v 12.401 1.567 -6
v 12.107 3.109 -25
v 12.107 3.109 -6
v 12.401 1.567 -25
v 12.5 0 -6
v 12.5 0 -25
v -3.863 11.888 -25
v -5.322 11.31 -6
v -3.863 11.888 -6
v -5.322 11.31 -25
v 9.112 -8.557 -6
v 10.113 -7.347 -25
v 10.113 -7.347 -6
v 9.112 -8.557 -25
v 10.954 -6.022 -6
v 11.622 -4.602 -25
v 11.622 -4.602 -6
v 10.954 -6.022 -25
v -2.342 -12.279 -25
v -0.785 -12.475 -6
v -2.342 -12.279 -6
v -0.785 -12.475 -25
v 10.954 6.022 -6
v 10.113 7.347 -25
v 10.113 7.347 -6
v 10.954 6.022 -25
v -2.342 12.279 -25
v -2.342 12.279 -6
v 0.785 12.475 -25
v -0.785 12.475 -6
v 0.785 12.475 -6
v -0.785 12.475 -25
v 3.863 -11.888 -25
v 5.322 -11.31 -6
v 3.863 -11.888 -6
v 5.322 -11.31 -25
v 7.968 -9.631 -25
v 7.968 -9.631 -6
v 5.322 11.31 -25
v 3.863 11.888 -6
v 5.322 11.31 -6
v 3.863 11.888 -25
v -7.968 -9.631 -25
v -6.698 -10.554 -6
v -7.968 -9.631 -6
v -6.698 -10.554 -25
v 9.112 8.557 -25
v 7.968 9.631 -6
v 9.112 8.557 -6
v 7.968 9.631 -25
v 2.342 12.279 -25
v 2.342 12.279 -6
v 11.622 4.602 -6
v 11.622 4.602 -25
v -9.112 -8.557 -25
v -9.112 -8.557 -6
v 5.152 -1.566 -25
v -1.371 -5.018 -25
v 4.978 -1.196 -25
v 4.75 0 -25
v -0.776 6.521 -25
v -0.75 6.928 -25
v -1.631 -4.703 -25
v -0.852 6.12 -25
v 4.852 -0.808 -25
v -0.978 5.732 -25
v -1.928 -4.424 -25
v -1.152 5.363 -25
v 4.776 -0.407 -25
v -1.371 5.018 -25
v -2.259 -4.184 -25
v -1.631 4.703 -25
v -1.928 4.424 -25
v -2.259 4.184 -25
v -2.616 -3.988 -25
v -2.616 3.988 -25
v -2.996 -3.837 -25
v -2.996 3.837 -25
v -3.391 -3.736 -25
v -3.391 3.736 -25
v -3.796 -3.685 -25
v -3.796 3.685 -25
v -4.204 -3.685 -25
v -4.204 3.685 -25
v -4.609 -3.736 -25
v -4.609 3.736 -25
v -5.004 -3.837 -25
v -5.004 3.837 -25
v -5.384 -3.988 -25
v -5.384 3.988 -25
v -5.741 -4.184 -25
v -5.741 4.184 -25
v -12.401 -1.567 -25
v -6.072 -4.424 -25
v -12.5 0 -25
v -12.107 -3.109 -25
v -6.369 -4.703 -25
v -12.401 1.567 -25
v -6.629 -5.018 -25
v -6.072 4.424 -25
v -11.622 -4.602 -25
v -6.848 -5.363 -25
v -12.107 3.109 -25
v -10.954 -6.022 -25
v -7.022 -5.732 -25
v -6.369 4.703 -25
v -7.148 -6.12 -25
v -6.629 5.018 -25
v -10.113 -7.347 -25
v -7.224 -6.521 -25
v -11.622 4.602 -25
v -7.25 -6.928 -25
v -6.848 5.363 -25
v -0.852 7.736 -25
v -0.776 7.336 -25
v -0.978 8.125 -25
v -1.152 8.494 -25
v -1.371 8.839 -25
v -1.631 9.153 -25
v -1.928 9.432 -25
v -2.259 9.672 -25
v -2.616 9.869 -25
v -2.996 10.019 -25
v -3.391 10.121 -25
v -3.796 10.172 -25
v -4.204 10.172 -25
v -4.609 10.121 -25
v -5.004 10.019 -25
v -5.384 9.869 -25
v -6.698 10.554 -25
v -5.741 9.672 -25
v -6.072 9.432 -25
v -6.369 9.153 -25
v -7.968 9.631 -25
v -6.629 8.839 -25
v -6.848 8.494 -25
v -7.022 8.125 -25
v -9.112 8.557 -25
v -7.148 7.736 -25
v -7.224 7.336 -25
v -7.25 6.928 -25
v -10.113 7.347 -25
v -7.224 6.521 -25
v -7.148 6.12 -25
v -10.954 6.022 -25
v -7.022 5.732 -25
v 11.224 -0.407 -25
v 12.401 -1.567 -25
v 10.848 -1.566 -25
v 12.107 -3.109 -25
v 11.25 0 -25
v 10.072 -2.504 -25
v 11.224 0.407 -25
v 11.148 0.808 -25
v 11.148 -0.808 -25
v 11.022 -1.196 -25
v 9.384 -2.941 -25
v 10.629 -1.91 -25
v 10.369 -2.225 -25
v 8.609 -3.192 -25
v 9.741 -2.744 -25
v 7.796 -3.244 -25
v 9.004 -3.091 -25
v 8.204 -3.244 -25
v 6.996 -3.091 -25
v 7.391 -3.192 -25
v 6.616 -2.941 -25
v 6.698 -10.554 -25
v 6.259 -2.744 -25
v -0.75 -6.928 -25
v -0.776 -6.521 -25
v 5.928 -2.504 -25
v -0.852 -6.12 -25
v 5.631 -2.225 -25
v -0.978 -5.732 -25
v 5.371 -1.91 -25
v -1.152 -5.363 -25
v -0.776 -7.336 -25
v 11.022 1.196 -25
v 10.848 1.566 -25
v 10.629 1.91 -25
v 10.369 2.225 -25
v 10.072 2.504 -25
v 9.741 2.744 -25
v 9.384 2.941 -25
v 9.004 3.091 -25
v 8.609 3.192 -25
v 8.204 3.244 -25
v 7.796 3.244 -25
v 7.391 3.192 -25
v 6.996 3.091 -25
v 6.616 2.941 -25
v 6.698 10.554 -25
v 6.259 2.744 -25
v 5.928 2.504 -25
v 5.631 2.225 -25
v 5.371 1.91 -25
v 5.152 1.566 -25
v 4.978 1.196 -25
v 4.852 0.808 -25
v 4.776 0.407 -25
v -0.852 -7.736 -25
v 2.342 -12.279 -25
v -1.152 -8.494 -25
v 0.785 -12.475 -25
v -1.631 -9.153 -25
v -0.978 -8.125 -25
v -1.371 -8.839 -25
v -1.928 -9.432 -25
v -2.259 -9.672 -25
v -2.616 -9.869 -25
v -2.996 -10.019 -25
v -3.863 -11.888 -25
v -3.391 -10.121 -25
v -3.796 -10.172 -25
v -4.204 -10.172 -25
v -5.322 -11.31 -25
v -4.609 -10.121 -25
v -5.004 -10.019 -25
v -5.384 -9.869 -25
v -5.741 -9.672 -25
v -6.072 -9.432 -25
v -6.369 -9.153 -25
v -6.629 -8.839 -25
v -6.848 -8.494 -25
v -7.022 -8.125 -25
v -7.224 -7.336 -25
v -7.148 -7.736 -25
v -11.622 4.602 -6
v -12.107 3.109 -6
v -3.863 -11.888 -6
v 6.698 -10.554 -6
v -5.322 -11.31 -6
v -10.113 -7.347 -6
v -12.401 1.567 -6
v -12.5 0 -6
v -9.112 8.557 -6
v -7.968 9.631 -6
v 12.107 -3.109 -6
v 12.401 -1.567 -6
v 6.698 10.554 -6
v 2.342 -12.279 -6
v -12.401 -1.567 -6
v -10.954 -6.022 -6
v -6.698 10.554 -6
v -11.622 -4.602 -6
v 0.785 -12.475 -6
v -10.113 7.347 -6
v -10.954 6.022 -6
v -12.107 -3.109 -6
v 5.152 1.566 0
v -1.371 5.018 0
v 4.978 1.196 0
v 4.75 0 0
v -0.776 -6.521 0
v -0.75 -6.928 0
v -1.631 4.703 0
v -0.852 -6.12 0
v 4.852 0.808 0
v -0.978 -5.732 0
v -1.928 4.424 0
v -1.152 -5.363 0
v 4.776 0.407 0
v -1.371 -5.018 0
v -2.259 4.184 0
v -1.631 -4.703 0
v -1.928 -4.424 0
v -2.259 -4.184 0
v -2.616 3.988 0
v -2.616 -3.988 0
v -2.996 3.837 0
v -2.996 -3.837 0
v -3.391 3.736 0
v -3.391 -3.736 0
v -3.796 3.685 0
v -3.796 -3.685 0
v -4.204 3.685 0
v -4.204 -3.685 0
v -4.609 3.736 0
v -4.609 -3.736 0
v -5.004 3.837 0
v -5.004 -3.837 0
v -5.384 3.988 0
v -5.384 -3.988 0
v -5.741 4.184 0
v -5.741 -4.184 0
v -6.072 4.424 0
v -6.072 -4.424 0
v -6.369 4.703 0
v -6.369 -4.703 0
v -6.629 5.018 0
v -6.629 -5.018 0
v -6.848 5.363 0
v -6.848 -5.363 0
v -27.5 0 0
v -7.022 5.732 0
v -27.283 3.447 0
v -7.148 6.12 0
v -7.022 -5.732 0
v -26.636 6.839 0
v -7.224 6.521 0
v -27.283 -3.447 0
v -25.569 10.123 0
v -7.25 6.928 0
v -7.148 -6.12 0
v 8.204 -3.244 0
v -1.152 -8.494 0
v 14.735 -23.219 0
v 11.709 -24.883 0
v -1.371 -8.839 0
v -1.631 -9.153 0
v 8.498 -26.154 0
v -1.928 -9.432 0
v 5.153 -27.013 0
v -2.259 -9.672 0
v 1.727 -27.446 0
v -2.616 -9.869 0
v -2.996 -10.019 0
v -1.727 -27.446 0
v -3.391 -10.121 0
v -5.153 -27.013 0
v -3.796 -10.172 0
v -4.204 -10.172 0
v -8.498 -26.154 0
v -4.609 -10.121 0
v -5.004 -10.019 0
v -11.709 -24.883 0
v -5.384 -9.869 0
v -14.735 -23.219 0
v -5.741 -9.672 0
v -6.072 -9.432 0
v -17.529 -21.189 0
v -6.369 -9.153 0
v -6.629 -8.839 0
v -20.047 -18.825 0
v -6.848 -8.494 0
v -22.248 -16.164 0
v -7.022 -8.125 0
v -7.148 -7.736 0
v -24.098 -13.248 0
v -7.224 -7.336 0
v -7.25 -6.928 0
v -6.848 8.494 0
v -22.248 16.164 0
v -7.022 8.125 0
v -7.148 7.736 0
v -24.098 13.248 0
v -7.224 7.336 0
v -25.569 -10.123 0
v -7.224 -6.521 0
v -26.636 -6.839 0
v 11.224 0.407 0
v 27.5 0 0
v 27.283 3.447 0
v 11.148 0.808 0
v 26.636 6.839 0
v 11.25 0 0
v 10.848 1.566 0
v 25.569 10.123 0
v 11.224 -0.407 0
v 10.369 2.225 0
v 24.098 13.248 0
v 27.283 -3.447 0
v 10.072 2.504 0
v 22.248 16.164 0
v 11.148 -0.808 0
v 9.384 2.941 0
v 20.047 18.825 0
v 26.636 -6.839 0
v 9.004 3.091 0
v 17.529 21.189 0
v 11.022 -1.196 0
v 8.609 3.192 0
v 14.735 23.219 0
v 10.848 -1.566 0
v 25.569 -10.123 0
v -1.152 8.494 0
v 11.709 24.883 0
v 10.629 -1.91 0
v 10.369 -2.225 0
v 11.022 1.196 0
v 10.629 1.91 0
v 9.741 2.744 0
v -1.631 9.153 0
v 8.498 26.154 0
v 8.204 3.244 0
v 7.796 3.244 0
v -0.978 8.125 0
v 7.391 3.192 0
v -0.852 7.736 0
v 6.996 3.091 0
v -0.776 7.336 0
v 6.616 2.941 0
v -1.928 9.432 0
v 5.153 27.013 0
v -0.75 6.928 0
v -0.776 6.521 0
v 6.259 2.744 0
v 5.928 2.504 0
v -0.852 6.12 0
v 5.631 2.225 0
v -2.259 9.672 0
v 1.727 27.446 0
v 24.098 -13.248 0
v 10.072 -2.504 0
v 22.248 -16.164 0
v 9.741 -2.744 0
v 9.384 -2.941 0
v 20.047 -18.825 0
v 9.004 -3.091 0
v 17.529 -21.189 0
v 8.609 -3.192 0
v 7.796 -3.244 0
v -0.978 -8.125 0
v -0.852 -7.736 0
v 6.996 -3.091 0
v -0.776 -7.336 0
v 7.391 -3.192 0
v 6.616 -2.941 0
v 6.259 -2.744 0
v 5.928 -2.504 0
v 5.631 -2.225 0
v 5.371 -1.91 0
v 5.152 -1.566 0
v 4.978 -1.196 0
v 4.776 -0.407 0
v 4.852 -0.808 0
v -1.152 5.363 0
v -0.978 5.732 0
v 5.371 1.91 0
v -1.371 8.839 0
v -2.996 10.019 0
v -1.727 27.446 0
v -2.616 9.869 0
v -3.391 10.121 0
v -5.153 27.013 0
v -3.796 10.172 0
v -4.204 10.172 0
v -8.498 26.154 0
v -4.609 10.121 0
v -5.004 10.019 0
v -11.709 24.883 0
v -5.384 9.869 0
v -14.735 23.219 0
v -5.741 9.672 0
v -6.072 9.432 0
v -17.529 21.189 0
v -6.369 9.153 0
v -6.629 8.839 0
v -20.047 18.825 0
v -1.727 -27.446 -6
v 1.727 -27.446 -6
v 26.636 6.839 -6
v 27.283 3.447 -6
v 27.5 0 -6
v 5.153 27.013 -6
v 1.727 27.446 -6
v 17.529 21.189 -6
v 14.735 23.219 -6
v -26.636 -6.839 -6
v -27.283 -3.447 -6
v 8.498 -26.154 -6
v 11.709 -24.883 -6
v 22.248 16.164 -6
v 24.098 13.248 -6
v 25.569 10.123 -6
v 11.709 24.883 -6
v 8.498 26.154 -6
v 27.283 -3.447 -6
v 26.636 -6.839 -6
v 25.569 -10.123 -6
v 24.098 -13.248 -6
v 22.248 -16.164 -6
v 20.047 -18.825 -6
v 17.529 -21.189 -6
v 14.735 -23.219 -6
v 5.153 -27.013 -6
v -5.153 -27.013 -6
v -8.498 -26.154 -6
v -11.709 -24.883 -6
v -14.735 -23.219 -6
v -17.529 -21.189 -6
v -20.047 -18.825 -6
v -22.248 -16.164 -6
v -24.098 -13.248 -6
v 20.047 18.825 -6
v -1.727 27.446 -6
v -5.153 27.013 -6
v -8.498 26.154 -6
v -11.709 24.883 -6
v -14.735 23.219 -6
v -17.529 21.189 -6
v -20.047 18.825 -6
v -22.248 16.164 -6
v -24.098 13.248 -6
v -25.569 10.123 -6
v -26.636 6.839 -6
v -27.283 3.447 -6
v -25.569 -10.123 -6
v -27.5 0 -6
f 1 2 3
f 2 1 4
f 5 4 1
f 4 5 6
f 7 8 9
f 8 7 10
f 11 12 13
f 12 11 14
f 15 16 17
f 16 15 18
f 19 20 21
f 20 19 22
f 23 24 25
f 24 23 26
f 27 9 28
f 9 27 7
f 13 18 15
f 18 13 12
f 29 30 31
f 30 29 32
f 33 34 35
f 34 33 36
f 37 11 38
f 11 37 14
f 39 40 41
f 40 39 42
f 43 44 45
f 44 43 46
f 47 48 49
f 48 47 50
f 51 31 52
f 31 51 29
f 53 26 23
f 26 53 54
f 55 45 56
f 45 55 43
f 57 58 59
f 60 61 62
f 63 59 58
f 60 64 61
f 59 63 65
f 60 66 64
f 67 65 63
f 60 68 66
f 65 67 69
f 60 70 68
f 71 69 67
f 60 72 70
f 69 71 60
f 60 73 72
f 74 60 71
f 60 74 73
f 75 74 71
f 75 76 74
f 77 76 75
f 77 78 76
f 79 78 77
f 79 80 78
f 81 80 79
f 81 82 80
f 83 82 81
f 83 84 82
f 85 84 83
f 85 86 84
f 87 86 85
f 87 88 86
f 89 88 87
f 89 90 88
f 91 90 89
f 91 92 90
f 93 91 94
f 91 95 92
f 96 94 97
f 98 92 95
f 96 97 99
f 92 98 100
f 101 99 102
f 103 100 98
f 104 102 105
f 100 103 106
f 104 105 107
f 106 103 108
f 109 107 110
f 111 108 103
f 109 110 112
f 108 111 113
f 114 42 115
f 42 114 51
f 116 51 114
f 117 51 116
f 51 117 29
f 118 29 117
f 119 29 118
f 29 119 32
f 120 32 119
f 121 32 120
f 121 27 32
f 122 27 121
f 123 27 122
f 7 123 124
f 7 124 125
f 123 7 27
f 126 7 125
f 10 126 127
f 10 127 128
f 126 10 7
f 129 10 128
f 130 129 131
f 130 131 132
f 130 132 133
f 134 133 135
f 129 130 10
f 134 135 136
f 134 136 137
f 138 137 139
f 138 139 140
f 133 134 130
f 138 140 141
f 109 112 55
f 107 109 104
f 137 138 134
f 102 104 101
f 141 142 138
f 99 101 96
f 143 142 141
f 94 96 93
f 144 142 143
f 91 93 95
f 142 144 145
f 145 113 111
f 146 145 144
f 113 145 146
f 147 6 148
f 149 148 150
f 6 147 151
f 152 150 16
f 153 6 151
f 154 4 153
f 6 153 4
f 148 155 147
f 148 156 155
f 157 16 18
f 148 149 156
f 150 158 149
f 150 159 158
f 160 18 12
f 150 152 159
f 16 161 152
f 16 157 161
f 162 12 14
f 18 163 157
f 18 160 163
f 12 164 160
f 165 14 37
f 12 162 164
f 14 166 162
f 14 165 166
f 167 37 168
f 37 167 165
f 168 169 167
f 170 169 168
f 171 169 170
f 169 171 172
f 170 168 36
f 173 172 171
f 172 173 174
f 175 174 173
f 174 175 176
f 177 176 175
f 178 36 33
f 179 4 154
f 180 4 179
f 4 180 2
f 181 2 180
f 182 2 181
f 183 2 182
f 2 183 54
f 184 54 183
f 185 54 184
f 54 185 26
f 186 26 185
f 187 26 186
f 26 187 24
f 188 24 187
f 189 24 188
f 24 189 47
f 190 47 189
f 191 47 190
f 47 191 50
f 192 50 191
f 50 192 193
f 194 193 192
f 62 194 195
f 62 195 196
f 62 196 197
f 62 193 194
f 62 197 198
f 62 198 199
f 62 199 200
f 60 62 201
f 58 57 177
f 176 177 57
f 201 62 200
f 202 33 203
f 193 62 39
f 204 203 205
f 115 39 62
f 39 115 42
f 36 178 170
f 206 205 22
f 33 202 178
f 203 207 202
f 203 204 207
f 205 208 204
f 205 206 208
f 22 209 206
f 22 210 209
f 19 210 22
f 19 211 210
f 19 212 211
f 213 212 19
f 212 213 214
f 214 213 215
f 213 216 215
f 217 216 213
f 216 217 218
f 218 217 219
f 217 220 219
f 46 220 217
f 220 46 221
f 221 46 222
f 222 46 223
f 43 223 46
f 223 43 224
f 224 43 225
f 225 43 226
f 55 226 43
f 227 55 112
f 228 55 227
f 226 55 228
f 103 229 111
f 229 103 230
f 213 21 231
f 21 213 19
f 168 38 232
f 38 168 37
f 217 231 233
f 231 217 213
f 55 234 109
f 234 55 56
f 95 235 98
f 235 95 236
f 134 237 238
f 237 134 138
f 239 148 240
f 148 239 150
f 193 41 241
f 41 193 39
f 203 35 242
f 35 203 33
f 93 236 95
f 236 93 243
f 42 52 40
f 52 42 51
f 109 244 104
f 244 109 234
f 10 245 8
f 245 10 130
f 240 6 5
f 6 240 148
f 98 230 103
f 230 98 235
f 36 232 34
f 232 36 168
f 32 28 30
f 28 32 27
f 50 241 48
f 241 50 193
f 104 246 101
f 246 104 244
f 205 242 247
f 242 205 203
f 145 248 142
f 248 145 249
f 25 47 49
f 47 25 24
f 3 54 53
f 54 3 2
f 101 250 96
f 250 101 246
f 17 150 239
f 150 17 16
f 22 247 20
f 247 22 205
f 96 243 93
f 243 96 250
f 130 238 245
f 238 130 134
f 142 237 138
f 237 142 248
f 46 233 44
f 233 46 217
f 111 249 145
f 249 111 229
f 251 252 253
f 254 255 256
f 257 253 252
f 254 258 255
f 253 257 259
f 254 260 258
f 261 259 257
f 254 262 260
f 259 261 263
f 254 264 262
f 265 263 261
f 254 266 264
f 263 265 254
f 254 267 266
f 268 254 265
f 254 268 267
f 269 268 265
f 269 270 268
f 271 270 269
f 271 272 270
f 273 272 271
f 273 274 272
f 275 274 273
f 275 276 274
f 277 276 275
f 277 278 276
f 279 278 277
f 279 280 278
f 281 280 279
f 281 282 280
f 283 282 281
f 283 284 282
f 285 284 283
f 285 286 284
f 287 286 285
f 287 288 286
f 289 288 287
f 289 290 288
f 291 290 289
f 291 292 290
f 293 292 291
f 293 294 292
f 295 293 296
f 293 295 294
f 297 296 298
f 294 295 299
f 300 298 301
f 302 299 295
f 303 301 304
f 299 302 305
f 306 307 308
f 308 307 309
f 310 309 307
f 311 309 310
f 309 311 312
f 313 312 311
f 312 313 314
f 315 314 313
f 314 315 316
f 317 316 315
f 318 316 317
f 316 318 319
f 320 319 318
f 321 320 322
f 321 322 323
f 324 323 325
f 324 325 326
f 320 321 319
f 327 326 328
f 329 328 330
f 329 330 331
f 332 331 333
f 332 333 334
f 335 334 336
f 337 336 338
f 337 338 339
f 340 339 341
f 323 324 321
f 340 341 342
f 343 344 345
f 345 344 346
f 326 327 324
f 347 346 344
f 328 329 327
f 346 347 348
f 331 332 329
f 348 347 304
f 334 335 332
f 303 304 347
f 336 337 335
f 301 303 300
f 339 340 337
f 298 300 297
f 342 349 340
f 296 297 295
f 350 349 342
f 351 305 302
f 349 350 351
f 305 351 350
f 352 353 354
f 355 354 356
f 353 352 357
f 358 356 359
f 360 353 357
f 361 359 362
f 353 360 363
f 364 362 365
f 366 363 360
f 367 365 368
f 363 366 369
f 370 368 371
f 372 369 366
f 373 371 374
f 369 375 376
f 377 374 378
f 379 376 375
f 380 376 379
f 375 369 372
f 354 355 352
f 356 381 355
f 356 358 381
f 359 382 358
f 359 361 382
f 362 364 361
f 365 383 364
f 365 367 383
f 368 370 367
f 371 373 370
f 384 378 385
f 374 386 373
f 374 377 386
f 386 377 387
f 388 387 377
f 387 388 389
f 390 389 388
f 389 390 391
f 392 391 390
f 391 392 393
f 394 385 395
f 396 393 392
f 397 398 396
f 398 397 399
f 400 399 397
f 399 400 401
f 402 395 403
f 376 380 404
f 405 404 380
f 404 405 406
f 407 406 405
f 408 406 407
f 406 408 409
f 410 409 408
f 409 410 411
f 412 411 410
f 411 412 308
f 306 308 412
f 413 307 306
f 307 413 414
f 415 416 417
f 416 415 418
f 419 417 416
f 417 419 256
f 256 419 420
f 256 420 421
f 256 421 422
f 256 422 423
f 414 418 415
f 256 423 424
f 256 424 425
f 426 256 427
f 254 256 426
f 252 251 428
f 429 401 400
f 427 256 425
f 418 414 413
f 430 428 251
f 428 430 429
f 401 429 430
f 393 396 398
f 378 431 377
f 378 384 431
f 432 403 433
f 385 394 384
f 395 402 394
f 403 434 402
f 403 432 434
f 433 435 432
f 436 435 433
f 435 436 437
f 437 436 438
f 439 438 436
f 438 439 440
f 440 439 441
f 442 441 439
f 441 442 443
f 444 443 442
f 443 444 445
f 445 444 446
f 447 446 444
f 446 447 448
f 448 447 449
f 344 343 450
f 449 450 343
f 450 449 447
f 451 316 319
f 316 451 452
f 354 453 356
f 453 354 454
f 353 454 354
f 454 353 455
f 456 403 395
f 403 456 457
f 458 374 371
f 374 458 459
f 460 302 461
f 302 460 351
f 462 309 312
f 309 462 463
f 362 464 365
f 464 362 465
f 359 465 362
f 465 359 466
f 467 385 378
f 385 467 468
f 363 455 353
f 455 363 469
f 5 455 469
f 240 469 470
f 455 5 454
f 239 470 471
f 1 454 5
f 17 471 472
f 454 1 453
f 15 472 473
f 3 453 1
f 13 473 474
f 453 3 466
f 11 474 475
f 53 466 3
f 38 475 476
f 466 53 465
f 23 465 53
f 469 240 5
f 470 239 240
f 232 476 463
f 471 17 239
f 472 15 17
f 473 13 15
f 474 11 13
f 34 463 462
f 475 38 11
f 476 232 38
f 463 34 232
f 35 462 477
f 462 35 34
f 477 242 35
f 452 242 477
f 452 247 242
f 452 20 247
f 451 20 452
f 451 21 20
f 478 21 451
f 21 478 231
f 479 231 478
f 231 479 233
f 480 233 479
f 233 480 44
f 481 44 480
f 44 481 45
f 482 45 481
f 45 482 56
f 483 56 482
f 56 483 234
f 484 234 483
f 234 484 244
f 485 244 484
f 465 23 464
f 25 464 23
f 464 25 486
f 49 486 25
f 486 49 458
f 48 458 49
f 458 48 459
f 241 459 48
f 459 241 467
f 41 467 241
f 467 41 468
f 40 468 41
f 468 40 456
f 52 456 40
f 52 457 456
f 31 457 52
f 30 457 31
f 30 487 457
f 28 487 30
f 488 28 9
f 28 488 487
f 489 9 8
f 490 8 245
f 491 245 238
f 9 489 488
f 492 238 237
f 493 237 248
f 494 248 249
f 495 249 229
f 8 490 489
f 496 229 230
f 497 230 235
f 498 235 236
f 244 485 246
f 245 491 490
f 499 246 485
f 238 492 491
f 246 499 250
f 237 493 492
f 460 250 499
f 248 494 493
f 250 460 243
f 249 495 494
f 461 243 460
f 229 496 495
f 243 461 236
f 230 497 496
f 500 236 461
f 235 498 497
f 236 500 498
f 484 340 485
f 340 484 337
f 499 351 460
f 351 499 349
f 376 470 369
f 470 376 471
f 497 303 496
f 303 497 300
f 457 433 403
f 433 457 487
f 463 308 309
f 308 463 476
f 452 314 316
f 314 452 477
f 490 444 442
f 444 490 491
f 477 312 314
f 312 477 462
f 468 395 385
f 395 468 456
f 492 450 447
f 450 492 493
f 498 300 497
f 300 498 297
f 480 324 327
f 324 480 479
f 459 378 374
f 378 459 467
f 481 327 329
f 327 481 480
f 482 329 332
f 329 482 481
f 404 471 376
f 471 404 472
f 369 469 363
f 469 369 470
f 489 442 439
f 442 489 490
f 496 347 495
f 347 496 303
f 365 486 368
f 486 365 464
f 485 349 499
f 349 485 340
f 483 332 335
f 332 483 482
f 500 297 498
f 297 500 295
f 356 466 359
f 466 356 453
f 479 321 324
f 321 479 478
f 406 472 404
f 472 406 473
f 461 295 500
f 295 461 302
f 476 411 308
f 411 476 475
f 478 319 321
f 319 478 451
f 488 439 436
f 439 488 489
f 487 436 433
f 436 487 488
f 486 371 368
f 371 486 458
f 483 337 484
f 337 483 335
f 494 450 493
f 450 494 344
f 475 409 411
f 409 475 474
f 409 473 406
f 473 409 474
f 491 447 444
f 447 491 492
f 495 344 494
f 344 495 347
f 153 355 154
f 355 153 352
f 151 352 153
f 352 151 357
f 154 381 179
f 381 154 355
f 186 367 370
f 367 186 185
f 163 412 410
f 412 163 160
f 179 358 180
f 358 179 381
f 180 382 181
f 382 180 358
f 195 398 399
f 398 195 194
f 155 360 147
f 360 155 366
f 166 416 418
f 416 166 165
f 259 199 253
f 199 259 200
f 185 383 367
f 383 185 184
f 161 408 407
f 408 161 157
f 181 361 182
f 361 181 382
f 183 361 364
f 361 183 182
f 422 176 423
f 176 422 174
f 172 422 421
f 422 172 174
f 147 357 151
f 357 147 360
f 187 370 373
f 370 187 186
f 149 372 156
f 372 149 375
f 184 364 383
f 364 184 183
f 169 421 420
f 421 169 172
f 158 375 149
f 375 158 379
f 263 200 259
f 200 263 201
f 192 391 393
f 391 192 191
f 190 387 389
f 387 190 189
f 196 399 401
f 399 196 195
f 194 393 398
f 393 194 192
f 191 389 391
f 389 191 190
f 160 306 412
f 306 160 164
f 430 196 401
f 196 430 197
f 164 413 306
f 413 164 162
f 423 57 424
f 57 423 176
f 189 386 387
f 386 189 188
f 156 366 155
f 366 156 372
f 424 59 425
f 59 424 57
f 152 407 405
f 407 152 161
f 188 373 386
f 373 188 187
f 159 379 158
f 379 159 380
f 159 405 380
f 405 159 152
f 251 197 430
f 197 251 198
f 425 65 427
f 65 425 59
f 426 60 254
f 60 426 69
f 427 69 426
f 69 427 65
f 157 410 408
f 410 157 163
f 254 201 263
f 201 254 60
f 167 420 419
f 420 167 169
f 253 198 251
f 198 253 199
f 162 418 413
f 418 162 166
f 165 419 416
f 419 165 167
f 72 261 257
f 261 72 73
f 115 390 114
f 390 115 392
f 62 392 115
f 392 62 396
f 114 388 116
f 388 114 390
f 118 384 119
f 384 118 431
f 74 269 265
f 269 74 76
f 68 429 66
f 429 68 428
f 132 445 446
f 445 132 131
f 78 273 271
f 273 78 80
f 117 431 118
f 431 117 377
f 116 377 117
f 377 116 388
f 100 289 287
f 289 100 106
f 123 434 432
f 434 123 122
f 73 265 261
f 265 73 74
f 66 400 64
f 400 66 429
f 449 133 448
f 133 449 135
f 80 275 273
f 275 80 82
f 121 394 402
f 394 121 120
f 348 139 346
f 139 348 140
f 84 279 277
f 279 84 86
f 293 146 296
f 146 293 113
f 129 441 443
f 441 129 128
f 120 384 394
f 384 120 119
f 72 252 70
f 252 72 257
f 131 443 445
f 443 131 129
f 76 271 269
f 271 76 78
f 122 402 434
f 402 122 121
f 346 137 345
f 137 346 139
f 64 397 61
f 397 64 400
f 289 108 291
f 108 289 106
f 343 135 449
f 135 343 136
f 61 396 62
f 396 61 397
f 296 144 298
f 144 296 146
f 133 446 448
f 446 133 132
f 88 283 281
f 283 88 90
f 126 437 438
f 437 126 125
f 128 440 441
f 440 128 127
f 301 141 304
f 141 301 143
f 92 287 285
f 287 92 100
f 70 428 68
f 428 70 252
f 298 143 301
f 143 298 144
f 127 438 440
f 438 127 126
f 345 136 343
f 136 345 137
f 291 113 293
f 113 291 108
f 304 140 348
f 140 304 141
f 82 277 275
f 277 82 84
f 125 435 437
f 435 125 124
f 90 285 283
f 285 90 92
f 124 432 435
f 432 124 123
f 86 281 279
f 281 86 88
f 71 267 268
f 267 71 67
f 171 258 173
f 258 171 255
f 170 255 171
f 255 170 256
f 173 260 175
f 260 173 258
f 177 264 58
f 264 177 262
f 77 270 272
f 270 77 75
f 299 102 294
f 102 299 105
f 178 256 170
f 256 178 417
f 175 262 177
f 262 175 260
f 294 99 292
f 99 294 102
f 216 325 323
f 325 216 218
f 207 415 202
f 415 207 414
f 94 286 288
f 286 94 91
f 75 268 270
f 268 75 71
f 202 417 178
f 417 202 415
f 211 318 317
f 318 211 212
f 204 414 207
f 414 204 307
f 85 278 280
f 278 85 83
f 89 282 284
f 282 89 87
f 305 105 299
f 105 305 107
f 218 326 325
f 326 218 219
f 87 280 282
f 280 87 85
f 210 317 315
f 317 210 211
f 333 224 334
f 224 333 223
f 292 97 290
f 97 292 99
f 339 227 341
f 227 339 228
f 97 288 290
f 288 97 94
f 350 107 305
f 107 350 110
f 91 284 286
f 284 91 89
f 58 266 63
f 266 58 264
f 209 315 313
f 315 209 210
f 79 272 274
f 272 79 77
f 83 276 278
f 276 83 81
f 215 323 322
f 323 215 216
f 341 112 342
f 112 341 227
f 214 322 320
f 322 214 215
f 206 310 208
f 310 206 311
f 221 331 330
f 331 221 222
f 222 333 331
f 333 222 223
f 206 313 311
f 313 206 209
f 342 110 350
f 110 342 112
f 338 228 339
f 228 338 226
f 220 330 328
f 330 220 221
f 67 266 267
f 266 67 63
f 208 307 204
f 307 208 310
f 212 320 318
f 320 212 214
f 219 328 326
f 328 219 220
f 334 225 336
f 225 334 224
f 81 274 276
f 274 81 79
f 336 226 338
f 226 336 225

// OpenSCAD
$fn = 50;


difference() {
	union() {
		translate(v = [0, 0, -25.0000000000]) {
			cylinder(h = 25, r = 12.5000000000);
		}
		translate(v = [0, 0, -6.0000000000]) {
			cylinder(h = 6, r = 27.5000000000);
		}
	}
	union() {
		#translate(v = [8.0000000000, 0.0000000000, -25]) {
			cylinder(h = 25, r = 3.2500000000);
		}
		#translate(v = [-4.0000000000, 6.9282032303, -25]) {
			cylinder(h = 25, r = 3.2500000000);
		}
		#translate(v = [-4.0000000000, -6.9282032303, -25]) {
			cylinder(h = 25, r = 3.2500000000);
		}
	}
}
